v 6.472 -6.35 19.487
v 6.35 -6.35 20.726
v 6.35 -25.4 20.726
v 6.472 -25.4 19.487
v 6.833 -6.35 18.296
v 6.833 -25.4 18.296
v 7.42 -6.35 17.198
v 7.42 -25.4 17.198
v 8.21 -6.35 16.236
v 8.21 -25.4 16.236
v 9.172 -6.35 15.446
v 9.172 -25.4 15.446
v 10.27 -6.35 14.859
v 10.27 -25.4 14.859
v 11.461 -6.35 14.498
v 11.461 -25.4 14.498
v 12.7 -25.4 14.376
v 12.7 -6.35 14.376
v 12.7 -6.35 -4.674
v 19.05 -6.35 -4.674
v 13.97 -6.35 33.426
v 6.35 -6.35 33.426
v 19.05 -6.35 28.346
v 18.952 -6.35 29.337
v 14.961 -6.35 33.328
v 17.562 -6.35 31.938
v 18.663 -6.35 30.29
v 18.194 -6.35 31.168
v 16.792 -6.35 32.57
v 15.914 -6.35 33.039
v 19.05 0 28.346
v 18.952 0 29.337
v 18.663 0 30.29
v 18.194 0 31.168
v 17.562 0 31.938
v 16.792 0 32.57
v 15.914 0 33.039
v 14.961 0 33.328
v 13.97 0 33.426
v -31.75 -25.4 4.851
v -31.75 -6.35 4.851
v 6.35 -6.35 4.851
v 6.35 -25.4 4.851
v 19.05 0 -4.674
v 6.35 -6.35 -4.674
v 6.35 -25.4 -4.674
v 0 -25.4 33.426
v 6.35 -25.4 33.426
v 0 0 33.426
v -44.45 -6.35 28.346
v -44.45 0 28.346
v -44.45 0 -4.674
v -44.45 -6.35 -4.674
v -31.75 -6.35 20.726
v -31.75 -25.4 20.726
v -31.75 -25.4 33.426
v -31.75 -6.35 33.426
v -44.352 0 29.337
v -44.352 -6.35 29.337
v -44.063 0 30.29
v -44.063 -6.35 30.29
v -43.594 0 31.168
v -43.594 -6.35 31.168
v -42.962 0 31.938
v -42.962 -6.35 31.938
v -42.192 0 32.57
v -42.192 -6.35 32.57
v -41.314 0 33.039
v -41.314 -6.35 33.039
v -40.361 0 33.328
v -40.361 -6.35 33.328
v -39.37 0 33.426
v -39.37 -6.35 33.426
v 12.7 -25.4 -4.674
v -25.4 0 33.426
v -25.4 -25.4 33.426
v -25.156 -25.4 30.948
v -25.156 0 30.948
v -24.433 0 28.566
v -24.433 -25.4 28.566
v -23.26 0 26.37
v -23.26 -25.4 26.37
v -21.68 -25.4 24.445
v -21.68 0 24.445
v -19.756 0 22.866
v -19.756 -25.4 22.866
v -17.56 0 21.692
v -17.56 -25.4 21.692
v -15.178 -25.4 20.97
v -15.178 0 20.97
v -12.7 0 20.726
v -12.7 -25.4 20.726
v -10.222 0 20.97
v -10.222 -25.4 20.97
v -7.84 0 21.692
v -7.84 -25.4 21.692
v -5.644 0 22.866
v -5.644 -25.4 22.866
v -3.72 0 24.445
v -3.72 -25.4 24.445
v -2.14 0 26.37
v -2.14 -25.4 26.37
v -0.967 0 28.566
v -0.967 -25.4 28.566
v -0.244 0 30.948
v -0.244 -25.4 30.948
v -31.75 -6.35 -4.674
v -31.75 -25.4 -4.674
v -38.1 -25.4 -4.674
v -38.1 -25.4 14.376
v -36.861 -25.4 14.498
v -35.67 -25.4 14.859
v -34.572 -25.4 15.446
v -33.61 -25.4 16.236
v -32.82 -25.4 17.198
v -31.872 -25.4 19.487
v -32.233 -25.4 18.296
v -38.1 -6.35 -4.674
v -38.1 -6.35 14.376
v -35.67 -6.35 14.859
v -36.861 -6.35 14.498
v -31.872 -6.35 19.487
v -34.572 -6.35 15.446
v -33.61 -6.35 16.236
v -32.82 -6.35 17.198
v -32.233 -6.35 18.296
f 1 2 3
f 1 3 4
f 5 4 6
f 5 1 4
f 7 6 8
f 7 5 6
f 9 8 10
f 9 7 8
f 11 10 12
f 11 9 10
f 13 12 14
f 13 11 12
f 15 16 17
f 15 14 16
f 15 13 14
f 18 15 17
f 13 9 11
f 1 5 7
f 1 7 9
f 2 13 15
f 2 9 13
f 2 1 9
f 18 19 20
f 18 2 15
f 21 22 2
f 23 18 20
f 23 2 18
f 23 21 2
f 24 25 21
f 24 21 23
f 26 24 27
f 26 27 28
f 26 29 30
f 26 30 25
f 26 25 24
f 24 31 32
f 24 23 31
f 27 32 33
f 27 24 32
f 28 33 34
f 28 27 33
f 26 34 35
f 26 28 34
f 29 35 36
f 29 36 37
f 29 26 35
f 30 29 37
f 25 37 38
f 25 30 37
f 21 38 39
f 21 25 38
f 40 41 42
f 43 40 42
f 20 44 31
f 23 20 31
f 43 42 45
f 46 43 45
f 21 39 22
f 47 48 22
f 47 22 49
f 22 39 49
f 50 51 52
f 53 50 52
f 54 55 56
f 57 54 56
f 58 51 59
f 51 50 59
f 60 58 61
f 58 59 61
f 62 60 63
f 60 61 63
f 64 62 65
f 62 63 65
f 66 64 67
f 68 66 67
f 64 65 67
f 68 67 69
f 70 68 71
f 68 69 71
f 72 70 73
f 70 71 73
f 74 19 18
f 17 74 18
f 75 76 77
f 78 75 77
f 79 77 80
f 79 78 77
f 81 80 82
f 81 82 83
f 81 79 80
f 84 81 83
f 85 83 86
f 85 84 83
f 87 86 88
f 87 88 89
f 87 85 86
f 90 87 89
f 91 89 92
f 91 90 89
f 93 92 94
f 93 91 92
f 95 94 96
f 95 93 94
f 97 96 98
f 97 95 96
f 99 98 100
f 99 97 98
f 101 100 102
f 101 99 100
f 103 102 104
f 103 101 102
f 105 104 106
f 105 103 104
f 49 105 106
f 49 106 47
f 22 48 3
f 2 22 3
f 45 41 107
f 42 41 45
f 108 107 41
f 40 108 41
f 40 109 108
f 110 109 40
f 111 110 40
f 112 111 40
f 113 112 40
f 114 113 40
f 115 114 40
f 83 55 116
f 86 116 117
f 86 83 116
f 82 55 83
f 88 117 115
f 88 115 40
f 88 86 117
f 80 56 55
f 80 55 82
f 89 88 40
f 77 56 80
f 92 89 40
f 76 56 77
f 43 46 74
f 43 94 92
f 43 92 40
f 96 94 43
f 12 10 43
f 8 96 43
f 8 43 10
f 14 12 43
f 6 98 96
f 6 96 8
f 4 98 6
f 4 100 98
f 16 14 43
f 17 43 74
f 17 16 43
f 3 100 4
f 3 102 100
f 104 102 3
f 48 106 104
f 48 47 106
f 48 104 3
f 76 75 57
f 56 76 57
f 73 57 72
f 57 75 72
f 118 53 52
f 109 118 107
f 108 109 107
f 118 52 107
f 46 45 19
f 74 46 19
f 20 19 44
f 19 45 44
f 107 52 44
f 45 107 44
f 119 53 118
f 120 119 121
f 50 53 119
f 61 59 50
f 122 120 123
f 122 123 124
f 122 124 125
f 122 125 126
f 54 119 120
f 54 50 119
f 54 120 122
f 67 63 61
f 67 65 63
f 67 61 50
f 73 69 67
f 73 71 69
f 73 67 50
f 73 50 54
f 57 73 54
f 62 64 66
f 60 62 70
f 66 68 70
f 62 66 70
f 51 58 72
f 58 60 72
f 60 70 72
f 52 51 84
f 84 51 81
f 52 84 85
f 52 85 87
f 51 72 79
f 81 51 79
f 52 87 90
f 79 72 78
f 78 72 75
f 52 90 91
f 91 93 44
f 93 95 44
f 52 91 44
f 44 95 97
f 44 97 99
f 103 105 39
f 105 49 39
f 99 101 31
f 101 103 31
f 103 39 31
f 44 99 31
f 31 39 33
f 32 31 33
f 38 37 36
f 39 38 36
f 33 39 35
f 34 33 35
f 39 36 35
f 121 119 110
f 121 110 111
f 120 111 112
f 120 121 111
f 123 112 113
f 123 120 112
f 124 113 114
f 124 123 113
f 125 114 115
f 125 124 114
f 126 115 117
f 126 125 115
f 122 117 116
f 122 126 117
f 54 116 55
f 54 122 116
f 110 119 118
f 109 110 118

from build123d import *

# Parameters (mm, degrees)
F1_DEPTH = 6.35
F2_R     = 5.08
F4_DEPTH = 19.05
F5_DEPTH = 25.4
F6_DEPTH = 25.4
F7_DEPTH = 72.5614
F8_DEPTH = 61.46767


with BuildPart() as f1:
    # F0 (on Front) → F1 (new body)
    with BuildSketch(Plane.XZ):
        with BuildLine():
            Line((-25.4, 33.425663), (-44.45, 33.425663))
            Line((-44.45, 33.425663), (-44.45, -4.674337))
            Line((-44.45, -4.674337), (19.05, -4.674337))
            Line((19.05, -4.674337), (19.05, 33.425663))
            Line((19.05, 33.425663), (0, 33.425663))
            ThreePointArc((0, 33.425663), (-12.7, 20.725663), (-25.4, 33.425663))
        make_face()
        with BuildLine():
            Line((0, 33.425663), (-25.4, 33.425663))
            ThreePointArc((-25.4, 33.425663), (-12.7, 20.725663), (0, 33.425663))
        make_face()
    extrude(amount=F1_DEPTH)

    # F2
    f2_edges = [f1.edges().sort_by_distance(p)[0] for p in [
        (-44.45, -3.175, 33.425663),
        (19.05, -3.175, 33.425663),
    ]]
    fillet(f2_edges, radius=F2_R)

    # F3 (on face) → F4 (join)
    with BuildSketch(Plane.XZ.offset(6.35)):
        with BuildLine():
            Line((-38.1, 14.375663), (-38.1, -4.674337))
            Line((-38.1, -4.674337), (-31.75, -4.674337))
            Line((-31.75, -4.674337), (-31.75, 4.850663))
            Line((-31.75, 4.850663), (6.35, 4.850663))
            Line((6.35, 4.850663), (6.35, -4.674337))
            Line((6.35, -4.674337), (12.7, -4.674337))
            Line((12.7, -4.674337), (12.7, 14.375663))
            ThreePointArc((12.7, 14.375663), (8.209872, 16.235535), (6.35, 20.725663))
            Line((6.35, 20.725663), (6.35, 33.425663))
            Line((6.35, 33.425663), (-31.75, 33.425663))
            Line((-31.75, 33.425663), (-31.75, 20.725663))
            ThreePointArc((-31.75, 20.725663), (-33.609872, 16.235535), (-38.1, 14.375663))
        make_face()
        with BuildLine():
            Line((-38.1, 33.425663), (-38.1, 14.375663))
            ThreePointArc((-38.1, 14.375663), (-33.609872, 16.235535), (-31.75, 20.725663))
            Line((-31.75, 20.725663), (-31.75, 33.425663))
            Line((-31.75, 33.425663), (-38.1, 33.425663))
        make_face()
        with BuildLine():
            Line((12.7, 33.425663), (6.35, 33.425663))
            Line((6.35, 33.425663), (6.35, 20.725663))
            ThreePointArc((6.35, 20.725663), (8.209872, 16.235535), (12.7, 14.375663))
            Line((12.7, 14.375663), (12.7, 33.425663))
        make_face()
    extrude(amount=F4_DEPTH)

    # F0 (on Front) → F5 (cut)
    with BuildSketch(Plane.XZ):
        with BuildLine():
            Line((0, 33.425663), (-25.4, 33.425663))
            ThreePointArc((-25.4, 33.425663), (-12.7, 20.725663), (0, 33.425663))
        make_face()
    extrude(amount=-F5_DEPTH, mode=Mode.SUBTRACT)

    # F0 (on Front) → F6 (cut)
    with BuildSketch(Plane.XZ):
        with BuildLine():
            Line((0, 33.425663), (-25.4, 33.425663))
            ThreePointArc((-25.4, 33.425663), (-12.7, 20.725663), (0, 33.425663))
        make_face()
    extrude(amount=F6_DEPTH, mode=Mode.SUBTRACT)

    # F3 (on face) + F4_face (on face) → F7 (cut)
    with BuildSketch(Plane.XZ.offset(6.35)):
        with BuildLine():
            Line((-38.1, 33.425663), (-38.1, 14.375663))
            ThreePointArc((-38.1, 14.375663), (-33.609872, 16.235535), (-31.75, 20.725663))
            Line((-31.75, 20.725663), (-31.75, 33.425663))
            Line((-31.75, 33.425663), (-38.1, 33.425663))
        make_face()
    with BuildSketch(Plane(origin=(-12.7, -25.4, 15.682621), x_dir=(1, 0, 0), z_dir=(0, -1, 0))):
        with BuildLine():
            Line((-25.4, 17.743042), (-25.4, -20.356958))
            Line((-25.4, -20.356958), (-19.05, -20.356958))
            Line((-19.05, -20.356958), (-19.05, -10.831958))
            Line((-19.05, -10.831958), (19.05, -10.831958))
            Line((19.05, -10.831958), (19.05, -20.356958))
            Line((19.05, -20.356958), (25.4, -20.356958))
            Line((25.4, -20.356958), (25.4, 17.743042))
            Line((25.4, 17.743042), (12.7, 17.743042))
            ThreePointArc((12.7, 17.743042), (0, 5.043042), (-12.7, 17.743042))
            Line((-12.7, 17.743042), (-25.4, 17.743042))
        make_face()
    extrude(amount=F7_DEPTH, mode=Mode.SUBTRACT)

    # F3 (on face) → F8 (cut)
    with BuildSketch(Plane.XZ.offset(6.35)):
        with BuildLine():
            Line((12.7, 33.425663), (6.35, 33.425663))
            Line((6.35, 33.425663), (6.35, 20.725663))
            ThreePointArc((6.35, 20.725663), (8.209872, 16.235535), (12.7, 14.375663))
            Line((12.7, 14.375663), (12.7, 33.425663))
        make_face()
    extrude(amount=F8_DEPTH, mode=Mode.SUBTRACT)


solid = f1.part
